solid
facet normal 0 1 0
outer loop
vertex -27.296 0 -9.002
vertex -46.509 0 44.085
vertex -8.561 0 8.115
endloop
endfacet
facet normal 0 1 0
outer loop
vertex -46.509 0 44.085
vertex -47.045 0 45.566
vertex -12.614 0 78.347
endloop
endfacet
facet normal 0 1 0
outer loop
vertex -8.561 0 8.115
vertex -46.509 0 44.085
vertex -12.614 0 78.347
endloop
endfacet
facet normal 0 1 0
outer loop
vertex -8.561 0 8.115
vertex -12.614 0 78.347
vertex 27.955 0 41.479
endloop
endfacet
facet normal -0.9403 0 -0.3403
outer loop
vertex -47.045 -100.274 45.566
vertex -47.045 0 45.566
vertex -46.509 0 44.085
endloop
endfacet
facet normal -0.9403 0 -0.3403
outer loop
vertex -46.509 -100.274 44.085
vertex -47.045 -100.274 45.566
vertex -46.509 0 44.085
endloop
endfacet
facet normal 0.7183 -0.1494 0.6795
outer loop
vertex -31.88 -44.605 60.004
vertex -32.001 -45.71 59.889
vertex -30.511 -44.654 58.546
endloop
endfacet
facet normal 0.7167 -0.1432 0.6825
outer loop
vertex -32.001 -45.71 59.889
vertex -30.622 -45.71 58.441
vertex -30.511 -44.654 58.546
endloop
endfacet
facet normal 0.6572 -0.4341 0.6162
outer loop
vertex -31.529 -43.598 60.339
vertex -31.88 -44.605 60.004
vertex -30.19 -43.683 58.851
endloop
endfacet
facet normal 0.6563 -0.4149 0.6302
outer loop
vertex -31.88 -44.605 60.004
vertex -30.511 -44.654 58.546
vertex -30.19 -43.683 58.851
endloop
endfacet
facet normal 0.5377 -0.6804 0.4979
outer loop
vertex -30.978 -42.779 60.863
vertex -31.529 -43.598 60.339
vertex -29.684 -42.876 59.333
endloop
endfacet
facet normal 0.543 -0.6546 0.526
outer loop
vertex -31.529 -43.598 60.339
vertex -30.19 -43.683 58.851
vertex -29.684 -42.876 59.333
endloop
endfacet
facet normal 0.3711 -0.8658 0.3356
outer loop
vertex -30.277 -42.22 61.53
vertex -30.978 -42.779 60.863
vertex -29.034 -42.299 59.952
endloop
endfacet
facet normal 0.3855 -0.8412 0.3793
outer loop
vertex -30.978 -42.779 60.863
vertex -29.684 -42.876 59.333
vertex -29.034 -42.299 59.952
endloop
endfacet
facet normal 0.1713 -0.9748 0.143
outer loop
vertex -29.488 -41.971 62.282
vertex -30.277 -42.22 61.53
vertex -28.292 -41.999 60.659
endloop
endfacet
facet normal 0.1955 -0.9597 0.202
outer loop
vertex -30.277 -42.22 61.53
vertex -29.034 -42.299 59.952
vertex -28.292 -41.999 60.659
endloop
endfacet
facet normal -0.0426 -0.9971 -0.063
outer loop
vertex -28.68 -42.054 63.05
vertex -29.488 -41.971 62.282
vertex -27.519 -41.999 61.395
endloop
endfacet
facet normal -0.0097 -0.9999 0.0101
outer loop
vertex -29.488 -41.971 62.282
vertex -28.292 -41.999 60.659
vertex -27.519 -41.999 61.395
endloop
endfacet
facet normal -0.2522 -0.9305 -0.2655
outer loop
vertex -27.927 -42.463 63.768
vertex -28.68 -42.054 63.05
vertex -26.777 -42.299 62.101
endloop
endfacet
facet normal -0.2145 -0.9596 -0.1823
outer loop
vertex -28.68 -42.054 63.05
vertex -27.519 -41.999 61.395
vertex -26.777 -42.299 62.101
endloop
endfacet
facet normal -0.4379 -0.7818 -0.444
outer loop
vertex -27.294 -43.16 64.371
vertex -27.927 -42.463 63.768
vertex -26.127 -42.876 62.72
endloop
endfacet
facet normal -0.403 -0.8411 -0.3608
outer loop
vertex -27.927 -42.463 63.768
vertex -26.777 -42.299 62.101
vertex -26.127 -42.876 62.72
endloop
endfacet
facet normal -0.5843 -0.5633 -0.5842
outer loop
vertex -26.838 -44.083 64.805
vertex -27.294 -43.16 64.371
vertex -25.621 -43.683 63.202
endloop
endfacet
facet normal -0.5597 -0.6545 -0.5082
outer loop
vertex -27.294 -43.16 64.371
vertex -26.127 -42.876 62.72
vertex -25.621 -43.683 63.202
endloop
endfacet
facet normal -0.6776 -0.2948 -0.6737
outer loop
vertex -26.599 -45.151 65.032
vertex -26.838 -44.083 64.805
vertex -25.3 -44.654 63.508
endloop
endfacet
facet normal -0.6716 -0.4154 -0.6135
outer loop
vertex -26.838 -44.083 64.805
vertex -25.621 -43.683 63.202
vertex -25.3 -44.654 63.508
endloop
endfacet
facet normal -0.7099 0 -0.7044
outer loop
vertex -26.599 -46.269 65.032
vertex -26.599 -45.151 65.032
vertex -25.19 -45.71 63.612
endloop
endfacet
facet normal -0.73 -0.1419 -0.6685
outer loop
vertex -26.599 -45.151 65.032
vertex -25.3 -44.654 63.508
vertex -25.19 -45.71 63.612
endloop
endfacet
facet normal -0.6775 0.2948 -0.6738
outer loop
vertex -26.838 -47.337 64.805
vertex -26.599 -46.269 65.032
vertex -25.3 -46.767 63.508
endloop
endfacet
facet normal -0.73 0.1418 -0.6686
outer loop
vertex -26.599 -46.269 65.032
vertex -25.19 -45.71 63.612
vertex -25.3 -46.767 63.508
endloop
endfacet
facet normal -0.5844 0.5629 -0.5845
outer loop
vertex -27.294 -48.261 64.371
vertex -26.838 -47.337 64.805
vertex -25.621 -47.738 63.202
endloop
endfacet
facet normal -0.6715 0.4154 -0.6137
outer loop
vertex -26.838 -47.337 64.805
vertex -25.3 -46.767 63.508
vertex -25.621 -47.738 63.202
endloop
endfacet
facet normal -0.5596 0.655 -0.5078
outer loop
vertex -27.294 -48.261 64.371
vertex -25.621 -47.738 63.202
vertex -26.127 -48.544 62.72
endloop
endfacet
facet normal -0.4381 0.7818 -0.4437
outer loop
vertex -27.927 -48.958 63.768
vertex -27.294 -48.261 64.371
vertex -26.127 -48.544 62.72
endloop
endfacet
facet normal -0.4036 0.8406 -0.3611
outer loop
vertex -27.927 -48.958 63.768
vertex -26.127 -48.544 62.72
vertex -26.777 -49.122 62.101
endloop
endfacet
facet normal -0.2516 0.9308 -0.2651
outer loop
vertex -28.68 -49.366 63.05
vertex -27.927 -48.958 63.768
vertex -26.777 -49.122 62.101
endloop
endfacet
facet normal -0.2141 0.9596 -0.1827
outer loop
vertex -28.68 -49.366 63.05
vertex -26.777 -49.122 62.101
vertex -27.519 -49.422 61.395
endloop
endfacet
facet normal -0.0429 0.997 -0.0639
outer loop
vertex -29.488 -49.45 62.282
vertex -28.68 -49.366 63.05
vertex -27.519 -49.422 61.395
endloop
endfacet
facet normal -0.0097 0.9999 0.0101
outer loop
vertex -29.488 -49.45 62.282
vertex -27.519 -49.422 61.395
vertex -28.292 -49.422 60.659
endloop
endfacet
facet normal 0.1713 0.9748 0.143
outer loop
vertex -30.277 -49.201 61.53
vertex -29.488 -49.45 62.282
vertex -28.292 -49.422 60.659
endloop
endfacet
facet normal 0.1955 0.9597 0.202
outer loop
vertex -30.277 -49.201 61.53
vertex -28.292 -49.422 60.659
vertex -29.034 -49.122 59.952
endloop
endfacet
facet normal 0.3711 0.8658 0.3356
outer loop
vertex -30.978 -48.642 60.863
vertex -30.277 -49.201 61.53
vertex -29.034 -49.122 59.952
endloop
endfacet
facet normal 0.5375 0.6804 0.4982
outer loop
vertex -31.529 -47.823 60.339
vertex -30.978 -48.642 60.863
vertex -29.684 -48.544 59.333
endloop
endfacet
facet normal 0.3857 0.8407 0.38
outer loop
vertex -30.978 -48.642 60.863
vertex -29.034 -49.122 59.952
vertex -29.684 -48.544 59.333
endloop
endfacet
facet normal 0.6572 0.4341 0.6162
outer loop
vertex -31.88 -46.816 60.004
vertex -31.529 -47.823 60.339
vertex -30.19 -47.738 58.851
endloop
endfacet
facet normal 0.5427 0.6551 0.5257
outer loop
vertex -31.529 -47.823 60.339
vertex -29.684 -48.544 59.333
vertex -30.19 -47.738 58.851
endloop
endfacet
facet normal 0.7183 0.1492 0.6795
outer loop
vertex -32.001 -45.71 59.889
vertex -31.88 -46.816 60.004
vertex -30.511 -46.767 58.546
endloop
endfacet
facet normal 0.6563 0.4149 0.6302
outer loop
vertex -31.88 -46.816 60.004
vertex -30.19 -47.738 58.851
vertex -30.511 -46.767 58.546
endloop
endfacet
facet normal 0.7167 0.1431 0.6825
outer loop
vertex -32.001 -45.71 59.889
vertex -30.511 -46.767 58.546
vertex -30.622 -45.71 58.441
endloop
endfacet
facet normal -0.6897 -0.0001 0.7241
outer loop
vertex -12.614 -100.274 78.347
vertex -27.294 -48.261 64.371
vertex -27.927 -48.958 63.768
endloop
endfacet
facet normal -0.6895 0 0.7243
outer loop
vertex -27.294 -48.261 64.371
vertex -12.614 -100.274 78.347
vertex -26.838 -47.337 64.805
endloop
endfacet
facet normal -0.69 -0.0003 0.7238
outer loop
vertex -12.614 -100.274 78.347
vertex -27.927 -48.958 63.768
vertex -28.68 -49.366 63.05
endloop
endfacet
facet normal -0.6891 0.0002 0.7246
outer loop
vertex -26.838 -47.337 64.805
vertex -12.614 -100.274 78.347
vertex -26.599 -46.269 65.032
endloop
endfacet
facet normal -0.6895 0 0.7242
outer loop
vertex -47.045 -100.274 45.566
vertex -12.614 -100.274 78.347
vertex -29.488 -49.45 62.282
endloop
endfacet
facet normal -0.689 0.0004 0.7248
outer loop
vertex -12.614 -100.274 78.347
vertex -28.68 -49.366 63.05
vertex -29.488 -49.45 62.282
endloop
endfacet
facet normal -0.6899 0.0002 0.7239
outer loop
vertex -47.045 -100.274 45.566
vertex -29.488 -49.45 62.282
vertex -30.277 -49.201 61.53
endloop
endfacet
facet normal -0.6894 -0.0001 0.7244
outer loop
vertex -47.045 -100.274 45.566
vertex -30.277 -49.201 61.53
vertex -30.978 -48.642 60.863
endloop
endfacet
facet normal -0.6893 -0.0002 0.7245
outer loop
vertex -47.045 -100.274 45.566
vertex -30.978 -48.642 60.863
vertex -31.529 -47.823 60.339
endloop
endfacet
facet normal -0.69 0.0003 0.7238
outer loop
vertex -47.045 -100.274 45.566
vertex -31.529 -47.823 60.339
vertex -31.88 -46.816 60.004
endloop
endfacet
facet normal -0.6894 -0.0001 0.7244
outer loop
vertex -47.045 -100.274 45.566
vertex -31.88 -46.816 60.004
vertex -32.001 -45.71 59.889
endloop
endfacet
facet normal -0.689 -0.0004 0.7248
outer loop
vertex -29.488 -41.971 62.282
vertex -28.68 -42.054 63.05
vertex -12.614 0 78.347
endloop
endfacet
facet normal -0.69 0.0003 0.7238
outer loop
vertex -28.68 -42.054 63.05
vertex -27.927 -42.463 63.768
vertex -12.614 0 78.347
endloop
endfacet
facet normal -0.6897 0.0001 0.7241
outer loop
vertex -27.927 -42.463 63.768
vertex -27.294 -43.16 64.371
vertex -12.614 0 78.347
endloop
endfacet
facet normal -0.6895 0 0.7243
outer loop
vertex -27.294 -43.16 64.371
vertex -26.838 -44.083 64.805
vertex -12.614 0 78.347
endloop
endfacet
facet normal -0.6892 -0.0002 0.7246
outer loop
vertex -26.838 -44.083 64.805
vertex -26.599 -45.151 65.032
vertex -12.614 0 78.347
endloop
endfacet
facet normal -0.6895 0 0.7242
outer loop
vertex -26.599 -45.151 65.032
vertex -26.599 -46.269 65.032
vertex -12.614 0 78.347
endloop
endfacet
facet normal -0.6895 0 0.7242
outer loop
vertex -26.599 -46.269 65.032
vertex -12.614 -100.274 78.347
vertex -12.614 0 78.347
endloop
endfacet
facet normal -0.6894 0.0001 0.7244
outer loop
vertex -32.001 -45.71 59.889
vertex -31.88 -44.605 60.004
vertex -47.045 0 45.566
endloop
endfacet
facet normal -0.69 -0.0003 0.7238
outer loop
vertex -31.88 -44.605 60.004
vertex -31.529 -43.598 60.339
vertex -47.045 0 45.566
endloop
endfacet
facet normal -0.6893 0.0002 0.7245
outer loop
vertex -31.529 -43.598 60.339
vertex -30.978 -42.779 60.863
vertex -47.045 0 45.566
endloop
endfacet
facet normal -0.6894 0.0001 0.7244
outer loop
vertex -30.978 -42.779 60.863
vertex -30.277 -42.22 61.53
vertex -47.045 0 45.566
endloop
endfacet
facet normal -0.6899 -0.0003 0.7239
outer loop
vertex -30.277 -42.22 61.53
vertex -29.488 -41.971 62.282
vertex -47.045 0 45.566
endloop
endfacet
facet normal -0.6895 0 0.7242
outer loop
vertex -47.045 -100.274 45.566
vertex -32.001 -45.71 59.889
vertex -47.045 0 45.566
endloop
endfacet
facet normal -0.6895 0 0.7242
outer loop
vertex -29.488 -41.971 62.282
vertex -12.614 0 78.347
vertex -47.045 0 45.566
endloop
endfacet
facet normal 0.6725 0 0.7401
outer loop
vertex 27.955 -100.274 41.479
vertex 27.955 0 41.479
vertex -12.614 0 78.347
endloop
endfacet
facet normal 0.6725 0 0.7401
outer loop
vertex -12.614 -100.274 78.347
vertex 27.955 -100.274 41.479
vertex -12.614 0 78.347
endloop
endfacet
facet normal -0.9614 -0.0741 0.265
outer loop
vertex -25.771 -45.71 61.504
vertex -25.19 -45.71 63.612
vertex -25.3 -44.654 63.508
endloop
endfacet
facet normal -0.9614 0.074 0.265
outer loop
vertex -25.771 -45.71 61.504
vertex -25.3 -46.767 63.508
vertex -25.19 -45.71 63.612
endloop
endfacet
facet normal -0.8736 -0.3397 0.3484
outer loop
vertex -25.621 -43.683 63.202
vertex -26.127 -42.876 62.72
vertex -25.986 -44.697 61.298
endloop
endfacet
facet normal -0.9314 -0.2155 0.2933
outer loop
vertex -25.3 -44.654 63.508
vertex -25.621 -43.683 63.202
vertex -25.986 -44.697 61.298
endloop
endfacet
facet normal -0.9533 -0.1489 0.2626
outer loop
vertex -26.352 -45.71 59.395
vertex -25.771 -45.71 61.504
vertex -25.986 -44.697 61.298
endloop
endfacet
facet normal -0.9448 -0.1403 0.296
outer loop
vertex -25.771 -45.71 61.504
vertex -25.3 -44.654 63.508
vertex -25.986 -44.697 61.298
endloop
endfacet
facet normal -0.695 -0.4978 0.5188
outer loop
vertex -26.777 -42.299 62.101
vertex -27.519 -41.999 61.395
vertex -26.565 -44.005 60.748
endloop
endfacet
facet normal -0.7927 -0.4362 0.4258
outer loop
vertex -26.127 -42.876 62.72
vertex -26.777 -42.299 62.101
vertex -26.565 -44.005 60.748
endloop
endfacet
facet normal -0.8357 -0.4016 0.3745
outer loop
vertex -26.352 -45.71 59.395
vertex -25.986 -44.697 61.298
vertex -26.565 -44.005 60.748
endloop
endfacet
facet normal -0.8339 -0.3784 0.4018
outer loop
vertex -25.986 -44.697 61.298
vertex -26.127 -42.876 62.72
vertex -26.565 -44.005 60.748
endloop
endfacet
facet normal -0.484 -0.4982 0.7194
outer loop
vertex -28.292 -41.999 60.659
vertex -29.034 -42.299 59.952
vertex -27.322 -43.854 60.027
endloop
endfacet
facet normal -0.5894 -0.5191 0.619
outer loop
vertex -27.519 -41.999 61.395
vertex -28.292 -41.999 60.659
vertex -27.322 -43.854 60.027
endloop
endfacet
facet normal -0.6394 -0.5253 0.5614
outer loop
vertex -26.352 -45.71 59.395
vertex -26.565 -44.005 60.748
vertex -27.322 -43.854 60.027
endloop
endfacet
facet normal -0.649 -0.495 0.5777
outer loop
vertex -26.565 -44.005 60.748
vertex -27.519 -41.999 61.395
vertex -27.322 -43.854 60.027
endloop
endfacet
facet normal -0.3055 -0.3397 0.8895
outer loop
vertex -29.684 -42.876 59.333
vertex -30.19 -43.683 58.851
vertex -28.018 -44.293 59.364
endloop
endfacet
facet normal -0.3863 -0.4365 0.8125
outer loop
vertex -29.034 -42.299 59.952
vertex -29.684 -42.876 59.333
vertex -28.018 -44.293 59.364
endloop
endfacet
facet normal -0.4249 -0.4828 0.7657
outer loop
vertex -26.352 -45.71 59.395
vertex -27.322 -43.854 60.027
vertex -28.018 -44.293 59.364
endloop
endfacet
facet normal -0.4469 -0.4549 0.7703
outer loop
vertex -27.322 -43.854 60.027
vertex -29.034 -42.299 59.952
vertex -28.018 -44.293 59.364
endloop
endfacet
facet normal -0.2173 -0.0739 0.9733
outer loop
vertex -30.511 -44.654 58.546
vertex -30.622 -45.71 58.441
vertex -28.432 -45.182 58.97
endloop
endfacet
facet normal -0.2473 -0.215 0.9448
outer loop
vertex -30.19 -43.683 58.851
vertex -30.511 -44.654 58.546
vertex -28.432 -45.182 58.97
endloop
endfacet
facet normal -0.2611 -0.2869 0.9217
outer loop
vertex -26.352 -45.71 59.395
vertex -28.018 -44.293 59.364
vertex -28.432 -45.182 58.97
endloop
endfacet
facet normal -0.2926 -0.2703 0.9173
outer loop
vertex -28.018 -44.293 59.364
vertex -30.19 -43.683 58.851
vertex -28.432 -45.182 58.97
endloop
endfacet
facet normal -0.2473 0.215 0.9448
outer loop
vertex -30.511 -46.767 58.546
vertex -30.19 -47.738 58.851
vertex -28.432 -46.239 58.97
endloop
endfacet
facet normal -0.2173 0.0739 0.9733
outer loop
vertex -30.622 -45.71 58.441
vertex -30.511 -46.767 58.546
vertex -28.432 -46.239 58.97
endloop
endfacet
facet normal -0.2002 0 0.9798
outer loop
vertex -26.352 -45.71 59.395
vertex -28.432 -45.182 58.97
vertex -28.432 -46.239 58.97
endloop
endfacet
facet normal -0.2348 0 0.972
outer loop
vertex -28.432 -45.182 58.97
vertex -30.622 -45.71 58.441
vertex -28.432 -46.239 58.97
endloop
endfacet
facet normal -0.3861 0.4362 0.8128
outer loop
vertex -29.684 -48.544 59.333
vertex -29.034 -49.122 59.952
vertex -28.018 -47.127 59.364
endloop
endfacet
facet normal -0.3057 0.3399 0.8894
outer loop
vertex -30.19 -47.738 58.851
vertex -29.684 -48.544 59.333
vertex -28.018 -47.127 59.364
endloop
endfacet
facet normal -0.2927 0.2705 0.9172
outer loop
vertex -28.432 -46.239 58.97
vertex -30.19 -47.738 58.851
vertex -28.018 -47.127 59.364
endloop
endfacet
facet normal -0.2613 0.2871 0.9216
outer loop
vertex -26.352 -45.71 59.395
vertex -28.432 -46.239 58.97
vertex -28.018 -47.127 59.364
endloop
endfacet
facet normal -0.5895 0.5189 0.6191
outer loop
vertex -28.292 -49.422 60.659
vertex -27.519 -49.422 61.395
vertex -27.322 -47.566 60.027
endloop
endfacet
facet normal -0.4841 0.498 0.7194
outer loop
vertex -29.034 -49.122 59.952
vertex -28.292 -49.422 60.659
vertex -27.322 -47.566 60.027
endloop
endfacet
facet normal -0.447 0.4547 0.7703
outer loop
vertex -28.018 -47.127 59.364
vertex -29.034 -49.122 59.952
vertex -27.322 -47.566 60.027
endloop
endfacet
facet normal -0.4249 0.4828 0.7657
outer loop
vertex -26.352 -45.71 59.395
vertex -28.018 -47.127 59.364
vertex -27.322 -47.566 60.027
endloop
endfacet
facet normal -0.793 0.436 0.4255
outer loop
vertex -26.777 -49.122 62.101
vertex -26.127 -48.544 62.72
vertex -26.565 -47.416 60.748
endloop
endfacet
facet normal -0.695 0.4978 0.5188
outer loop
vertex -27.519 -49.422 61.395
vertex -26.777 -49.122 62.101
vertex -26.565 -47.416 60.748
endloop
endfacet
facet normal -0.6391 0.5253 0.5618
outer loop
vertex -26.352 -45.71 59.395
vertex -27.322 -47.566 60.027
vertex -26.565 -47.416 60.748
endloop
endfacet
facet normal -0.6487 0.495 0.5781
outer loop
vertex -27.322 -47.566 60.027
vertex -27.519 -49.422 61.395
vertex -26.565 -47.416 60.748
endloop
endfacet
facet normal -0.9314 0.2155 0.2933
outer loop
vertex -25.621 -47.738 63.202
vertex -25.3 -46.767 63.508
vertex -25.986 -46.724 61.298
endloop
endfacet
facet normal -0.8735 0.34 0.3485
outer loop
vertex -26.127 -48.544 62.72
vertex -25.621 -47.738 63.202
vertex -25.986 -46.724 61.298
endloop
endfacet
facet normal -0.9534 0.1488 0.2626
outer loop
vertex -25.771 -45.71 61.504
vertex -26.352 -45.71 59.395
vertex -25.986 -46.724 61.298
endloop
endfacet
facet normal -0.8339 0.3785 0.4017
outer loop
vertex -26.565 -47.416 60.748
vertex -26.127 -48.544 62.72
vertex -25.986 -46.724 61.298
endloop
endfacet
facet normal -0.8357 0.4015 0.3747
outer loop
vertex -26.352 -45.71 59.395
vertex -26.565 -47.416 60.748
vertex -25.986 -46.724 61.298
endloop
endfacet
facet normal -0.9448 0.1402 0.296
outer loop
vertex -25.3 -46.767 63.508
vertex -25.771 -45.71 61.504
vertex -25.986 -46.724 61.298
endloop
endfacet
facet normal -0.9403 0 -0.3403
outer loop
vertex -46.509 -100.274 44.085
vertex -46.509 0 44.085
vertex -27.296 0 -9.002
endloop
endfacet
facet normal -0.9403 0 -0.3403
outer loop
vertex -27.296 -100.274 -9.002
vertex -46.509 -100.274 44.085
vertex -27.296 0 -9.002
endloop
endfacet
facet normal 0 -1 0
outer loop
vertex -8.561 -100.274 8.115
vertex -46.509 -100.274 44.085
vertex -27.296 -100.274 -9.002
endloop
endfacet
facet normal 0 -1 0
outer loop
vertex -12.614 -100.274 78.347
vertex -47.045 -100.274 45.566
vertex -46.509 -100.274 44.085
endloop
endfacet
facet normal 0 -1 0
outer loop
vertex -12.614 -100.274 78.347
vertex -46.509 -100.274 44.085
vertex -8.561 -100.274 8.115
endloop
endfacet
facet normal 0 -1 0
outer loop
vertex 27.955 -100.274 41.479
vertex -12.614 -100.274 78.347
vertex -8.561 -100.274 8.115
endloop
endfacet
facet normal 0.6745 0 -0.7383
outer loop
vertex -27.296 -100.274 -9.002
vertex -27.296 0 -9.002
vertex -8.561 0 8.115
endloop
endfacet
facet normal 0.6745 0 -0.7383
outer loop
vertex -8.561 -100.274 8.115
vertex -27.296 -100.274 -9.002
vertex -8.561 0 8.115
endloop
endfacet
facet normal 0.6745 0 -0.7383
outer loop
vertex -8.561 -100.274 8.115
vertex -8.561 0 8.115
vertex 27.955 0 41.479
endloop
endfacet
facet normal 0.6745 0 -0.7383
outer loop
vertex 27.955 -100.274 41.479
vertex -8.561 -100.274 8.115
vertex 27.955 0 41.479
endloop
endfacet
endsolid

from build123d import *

# Parameters (mm, degrees)
F1_DEPTH = 100.2740859985
F3_D     = 7.5
F3_DEPTH = 2
F3_TIP   = 2.2532273214


with BuildPart() as f1:
    # F0 (on Front) → F1 (new body)
    with BuildSketch(Plane.XZ):
        Polygon((-8.5613747377, 8.1151898103), (-46.5092712761, 44.0853923477), (-27.2959015118, -9.0020827425), align=None)
        Polygon((-47.045001057, 45.5656397871), (-46.5092712761, 44.0853923477), (-8.5613747377, 8.1151898103), (27.9545485973, 41.4788834751), (-12.6136355102, 78.3473849297), align=None)
    extrude(amount=F1_DEPTH)

    # F3
    with Locations(Plane(origin=(-45.1239530897, 0, 47.3946495829), x_dir=(0.7242433012, 0, 0.6895445168), z_dir=(-0.6895445168, 0, 0.7242433012))):
        with Locations((21.8701027334, -45.7103922963)):
            Hole(F3_D / 2, depth=F3_DEPTH)
            with Locations((0, 0, -(F3_DEPTH + F3_TIP / 2))):  # 118° drill point
                Cone(0, F3_D / 2, F3_TIP, mode=Mode.SUBTRACT)


solid = f1.part
